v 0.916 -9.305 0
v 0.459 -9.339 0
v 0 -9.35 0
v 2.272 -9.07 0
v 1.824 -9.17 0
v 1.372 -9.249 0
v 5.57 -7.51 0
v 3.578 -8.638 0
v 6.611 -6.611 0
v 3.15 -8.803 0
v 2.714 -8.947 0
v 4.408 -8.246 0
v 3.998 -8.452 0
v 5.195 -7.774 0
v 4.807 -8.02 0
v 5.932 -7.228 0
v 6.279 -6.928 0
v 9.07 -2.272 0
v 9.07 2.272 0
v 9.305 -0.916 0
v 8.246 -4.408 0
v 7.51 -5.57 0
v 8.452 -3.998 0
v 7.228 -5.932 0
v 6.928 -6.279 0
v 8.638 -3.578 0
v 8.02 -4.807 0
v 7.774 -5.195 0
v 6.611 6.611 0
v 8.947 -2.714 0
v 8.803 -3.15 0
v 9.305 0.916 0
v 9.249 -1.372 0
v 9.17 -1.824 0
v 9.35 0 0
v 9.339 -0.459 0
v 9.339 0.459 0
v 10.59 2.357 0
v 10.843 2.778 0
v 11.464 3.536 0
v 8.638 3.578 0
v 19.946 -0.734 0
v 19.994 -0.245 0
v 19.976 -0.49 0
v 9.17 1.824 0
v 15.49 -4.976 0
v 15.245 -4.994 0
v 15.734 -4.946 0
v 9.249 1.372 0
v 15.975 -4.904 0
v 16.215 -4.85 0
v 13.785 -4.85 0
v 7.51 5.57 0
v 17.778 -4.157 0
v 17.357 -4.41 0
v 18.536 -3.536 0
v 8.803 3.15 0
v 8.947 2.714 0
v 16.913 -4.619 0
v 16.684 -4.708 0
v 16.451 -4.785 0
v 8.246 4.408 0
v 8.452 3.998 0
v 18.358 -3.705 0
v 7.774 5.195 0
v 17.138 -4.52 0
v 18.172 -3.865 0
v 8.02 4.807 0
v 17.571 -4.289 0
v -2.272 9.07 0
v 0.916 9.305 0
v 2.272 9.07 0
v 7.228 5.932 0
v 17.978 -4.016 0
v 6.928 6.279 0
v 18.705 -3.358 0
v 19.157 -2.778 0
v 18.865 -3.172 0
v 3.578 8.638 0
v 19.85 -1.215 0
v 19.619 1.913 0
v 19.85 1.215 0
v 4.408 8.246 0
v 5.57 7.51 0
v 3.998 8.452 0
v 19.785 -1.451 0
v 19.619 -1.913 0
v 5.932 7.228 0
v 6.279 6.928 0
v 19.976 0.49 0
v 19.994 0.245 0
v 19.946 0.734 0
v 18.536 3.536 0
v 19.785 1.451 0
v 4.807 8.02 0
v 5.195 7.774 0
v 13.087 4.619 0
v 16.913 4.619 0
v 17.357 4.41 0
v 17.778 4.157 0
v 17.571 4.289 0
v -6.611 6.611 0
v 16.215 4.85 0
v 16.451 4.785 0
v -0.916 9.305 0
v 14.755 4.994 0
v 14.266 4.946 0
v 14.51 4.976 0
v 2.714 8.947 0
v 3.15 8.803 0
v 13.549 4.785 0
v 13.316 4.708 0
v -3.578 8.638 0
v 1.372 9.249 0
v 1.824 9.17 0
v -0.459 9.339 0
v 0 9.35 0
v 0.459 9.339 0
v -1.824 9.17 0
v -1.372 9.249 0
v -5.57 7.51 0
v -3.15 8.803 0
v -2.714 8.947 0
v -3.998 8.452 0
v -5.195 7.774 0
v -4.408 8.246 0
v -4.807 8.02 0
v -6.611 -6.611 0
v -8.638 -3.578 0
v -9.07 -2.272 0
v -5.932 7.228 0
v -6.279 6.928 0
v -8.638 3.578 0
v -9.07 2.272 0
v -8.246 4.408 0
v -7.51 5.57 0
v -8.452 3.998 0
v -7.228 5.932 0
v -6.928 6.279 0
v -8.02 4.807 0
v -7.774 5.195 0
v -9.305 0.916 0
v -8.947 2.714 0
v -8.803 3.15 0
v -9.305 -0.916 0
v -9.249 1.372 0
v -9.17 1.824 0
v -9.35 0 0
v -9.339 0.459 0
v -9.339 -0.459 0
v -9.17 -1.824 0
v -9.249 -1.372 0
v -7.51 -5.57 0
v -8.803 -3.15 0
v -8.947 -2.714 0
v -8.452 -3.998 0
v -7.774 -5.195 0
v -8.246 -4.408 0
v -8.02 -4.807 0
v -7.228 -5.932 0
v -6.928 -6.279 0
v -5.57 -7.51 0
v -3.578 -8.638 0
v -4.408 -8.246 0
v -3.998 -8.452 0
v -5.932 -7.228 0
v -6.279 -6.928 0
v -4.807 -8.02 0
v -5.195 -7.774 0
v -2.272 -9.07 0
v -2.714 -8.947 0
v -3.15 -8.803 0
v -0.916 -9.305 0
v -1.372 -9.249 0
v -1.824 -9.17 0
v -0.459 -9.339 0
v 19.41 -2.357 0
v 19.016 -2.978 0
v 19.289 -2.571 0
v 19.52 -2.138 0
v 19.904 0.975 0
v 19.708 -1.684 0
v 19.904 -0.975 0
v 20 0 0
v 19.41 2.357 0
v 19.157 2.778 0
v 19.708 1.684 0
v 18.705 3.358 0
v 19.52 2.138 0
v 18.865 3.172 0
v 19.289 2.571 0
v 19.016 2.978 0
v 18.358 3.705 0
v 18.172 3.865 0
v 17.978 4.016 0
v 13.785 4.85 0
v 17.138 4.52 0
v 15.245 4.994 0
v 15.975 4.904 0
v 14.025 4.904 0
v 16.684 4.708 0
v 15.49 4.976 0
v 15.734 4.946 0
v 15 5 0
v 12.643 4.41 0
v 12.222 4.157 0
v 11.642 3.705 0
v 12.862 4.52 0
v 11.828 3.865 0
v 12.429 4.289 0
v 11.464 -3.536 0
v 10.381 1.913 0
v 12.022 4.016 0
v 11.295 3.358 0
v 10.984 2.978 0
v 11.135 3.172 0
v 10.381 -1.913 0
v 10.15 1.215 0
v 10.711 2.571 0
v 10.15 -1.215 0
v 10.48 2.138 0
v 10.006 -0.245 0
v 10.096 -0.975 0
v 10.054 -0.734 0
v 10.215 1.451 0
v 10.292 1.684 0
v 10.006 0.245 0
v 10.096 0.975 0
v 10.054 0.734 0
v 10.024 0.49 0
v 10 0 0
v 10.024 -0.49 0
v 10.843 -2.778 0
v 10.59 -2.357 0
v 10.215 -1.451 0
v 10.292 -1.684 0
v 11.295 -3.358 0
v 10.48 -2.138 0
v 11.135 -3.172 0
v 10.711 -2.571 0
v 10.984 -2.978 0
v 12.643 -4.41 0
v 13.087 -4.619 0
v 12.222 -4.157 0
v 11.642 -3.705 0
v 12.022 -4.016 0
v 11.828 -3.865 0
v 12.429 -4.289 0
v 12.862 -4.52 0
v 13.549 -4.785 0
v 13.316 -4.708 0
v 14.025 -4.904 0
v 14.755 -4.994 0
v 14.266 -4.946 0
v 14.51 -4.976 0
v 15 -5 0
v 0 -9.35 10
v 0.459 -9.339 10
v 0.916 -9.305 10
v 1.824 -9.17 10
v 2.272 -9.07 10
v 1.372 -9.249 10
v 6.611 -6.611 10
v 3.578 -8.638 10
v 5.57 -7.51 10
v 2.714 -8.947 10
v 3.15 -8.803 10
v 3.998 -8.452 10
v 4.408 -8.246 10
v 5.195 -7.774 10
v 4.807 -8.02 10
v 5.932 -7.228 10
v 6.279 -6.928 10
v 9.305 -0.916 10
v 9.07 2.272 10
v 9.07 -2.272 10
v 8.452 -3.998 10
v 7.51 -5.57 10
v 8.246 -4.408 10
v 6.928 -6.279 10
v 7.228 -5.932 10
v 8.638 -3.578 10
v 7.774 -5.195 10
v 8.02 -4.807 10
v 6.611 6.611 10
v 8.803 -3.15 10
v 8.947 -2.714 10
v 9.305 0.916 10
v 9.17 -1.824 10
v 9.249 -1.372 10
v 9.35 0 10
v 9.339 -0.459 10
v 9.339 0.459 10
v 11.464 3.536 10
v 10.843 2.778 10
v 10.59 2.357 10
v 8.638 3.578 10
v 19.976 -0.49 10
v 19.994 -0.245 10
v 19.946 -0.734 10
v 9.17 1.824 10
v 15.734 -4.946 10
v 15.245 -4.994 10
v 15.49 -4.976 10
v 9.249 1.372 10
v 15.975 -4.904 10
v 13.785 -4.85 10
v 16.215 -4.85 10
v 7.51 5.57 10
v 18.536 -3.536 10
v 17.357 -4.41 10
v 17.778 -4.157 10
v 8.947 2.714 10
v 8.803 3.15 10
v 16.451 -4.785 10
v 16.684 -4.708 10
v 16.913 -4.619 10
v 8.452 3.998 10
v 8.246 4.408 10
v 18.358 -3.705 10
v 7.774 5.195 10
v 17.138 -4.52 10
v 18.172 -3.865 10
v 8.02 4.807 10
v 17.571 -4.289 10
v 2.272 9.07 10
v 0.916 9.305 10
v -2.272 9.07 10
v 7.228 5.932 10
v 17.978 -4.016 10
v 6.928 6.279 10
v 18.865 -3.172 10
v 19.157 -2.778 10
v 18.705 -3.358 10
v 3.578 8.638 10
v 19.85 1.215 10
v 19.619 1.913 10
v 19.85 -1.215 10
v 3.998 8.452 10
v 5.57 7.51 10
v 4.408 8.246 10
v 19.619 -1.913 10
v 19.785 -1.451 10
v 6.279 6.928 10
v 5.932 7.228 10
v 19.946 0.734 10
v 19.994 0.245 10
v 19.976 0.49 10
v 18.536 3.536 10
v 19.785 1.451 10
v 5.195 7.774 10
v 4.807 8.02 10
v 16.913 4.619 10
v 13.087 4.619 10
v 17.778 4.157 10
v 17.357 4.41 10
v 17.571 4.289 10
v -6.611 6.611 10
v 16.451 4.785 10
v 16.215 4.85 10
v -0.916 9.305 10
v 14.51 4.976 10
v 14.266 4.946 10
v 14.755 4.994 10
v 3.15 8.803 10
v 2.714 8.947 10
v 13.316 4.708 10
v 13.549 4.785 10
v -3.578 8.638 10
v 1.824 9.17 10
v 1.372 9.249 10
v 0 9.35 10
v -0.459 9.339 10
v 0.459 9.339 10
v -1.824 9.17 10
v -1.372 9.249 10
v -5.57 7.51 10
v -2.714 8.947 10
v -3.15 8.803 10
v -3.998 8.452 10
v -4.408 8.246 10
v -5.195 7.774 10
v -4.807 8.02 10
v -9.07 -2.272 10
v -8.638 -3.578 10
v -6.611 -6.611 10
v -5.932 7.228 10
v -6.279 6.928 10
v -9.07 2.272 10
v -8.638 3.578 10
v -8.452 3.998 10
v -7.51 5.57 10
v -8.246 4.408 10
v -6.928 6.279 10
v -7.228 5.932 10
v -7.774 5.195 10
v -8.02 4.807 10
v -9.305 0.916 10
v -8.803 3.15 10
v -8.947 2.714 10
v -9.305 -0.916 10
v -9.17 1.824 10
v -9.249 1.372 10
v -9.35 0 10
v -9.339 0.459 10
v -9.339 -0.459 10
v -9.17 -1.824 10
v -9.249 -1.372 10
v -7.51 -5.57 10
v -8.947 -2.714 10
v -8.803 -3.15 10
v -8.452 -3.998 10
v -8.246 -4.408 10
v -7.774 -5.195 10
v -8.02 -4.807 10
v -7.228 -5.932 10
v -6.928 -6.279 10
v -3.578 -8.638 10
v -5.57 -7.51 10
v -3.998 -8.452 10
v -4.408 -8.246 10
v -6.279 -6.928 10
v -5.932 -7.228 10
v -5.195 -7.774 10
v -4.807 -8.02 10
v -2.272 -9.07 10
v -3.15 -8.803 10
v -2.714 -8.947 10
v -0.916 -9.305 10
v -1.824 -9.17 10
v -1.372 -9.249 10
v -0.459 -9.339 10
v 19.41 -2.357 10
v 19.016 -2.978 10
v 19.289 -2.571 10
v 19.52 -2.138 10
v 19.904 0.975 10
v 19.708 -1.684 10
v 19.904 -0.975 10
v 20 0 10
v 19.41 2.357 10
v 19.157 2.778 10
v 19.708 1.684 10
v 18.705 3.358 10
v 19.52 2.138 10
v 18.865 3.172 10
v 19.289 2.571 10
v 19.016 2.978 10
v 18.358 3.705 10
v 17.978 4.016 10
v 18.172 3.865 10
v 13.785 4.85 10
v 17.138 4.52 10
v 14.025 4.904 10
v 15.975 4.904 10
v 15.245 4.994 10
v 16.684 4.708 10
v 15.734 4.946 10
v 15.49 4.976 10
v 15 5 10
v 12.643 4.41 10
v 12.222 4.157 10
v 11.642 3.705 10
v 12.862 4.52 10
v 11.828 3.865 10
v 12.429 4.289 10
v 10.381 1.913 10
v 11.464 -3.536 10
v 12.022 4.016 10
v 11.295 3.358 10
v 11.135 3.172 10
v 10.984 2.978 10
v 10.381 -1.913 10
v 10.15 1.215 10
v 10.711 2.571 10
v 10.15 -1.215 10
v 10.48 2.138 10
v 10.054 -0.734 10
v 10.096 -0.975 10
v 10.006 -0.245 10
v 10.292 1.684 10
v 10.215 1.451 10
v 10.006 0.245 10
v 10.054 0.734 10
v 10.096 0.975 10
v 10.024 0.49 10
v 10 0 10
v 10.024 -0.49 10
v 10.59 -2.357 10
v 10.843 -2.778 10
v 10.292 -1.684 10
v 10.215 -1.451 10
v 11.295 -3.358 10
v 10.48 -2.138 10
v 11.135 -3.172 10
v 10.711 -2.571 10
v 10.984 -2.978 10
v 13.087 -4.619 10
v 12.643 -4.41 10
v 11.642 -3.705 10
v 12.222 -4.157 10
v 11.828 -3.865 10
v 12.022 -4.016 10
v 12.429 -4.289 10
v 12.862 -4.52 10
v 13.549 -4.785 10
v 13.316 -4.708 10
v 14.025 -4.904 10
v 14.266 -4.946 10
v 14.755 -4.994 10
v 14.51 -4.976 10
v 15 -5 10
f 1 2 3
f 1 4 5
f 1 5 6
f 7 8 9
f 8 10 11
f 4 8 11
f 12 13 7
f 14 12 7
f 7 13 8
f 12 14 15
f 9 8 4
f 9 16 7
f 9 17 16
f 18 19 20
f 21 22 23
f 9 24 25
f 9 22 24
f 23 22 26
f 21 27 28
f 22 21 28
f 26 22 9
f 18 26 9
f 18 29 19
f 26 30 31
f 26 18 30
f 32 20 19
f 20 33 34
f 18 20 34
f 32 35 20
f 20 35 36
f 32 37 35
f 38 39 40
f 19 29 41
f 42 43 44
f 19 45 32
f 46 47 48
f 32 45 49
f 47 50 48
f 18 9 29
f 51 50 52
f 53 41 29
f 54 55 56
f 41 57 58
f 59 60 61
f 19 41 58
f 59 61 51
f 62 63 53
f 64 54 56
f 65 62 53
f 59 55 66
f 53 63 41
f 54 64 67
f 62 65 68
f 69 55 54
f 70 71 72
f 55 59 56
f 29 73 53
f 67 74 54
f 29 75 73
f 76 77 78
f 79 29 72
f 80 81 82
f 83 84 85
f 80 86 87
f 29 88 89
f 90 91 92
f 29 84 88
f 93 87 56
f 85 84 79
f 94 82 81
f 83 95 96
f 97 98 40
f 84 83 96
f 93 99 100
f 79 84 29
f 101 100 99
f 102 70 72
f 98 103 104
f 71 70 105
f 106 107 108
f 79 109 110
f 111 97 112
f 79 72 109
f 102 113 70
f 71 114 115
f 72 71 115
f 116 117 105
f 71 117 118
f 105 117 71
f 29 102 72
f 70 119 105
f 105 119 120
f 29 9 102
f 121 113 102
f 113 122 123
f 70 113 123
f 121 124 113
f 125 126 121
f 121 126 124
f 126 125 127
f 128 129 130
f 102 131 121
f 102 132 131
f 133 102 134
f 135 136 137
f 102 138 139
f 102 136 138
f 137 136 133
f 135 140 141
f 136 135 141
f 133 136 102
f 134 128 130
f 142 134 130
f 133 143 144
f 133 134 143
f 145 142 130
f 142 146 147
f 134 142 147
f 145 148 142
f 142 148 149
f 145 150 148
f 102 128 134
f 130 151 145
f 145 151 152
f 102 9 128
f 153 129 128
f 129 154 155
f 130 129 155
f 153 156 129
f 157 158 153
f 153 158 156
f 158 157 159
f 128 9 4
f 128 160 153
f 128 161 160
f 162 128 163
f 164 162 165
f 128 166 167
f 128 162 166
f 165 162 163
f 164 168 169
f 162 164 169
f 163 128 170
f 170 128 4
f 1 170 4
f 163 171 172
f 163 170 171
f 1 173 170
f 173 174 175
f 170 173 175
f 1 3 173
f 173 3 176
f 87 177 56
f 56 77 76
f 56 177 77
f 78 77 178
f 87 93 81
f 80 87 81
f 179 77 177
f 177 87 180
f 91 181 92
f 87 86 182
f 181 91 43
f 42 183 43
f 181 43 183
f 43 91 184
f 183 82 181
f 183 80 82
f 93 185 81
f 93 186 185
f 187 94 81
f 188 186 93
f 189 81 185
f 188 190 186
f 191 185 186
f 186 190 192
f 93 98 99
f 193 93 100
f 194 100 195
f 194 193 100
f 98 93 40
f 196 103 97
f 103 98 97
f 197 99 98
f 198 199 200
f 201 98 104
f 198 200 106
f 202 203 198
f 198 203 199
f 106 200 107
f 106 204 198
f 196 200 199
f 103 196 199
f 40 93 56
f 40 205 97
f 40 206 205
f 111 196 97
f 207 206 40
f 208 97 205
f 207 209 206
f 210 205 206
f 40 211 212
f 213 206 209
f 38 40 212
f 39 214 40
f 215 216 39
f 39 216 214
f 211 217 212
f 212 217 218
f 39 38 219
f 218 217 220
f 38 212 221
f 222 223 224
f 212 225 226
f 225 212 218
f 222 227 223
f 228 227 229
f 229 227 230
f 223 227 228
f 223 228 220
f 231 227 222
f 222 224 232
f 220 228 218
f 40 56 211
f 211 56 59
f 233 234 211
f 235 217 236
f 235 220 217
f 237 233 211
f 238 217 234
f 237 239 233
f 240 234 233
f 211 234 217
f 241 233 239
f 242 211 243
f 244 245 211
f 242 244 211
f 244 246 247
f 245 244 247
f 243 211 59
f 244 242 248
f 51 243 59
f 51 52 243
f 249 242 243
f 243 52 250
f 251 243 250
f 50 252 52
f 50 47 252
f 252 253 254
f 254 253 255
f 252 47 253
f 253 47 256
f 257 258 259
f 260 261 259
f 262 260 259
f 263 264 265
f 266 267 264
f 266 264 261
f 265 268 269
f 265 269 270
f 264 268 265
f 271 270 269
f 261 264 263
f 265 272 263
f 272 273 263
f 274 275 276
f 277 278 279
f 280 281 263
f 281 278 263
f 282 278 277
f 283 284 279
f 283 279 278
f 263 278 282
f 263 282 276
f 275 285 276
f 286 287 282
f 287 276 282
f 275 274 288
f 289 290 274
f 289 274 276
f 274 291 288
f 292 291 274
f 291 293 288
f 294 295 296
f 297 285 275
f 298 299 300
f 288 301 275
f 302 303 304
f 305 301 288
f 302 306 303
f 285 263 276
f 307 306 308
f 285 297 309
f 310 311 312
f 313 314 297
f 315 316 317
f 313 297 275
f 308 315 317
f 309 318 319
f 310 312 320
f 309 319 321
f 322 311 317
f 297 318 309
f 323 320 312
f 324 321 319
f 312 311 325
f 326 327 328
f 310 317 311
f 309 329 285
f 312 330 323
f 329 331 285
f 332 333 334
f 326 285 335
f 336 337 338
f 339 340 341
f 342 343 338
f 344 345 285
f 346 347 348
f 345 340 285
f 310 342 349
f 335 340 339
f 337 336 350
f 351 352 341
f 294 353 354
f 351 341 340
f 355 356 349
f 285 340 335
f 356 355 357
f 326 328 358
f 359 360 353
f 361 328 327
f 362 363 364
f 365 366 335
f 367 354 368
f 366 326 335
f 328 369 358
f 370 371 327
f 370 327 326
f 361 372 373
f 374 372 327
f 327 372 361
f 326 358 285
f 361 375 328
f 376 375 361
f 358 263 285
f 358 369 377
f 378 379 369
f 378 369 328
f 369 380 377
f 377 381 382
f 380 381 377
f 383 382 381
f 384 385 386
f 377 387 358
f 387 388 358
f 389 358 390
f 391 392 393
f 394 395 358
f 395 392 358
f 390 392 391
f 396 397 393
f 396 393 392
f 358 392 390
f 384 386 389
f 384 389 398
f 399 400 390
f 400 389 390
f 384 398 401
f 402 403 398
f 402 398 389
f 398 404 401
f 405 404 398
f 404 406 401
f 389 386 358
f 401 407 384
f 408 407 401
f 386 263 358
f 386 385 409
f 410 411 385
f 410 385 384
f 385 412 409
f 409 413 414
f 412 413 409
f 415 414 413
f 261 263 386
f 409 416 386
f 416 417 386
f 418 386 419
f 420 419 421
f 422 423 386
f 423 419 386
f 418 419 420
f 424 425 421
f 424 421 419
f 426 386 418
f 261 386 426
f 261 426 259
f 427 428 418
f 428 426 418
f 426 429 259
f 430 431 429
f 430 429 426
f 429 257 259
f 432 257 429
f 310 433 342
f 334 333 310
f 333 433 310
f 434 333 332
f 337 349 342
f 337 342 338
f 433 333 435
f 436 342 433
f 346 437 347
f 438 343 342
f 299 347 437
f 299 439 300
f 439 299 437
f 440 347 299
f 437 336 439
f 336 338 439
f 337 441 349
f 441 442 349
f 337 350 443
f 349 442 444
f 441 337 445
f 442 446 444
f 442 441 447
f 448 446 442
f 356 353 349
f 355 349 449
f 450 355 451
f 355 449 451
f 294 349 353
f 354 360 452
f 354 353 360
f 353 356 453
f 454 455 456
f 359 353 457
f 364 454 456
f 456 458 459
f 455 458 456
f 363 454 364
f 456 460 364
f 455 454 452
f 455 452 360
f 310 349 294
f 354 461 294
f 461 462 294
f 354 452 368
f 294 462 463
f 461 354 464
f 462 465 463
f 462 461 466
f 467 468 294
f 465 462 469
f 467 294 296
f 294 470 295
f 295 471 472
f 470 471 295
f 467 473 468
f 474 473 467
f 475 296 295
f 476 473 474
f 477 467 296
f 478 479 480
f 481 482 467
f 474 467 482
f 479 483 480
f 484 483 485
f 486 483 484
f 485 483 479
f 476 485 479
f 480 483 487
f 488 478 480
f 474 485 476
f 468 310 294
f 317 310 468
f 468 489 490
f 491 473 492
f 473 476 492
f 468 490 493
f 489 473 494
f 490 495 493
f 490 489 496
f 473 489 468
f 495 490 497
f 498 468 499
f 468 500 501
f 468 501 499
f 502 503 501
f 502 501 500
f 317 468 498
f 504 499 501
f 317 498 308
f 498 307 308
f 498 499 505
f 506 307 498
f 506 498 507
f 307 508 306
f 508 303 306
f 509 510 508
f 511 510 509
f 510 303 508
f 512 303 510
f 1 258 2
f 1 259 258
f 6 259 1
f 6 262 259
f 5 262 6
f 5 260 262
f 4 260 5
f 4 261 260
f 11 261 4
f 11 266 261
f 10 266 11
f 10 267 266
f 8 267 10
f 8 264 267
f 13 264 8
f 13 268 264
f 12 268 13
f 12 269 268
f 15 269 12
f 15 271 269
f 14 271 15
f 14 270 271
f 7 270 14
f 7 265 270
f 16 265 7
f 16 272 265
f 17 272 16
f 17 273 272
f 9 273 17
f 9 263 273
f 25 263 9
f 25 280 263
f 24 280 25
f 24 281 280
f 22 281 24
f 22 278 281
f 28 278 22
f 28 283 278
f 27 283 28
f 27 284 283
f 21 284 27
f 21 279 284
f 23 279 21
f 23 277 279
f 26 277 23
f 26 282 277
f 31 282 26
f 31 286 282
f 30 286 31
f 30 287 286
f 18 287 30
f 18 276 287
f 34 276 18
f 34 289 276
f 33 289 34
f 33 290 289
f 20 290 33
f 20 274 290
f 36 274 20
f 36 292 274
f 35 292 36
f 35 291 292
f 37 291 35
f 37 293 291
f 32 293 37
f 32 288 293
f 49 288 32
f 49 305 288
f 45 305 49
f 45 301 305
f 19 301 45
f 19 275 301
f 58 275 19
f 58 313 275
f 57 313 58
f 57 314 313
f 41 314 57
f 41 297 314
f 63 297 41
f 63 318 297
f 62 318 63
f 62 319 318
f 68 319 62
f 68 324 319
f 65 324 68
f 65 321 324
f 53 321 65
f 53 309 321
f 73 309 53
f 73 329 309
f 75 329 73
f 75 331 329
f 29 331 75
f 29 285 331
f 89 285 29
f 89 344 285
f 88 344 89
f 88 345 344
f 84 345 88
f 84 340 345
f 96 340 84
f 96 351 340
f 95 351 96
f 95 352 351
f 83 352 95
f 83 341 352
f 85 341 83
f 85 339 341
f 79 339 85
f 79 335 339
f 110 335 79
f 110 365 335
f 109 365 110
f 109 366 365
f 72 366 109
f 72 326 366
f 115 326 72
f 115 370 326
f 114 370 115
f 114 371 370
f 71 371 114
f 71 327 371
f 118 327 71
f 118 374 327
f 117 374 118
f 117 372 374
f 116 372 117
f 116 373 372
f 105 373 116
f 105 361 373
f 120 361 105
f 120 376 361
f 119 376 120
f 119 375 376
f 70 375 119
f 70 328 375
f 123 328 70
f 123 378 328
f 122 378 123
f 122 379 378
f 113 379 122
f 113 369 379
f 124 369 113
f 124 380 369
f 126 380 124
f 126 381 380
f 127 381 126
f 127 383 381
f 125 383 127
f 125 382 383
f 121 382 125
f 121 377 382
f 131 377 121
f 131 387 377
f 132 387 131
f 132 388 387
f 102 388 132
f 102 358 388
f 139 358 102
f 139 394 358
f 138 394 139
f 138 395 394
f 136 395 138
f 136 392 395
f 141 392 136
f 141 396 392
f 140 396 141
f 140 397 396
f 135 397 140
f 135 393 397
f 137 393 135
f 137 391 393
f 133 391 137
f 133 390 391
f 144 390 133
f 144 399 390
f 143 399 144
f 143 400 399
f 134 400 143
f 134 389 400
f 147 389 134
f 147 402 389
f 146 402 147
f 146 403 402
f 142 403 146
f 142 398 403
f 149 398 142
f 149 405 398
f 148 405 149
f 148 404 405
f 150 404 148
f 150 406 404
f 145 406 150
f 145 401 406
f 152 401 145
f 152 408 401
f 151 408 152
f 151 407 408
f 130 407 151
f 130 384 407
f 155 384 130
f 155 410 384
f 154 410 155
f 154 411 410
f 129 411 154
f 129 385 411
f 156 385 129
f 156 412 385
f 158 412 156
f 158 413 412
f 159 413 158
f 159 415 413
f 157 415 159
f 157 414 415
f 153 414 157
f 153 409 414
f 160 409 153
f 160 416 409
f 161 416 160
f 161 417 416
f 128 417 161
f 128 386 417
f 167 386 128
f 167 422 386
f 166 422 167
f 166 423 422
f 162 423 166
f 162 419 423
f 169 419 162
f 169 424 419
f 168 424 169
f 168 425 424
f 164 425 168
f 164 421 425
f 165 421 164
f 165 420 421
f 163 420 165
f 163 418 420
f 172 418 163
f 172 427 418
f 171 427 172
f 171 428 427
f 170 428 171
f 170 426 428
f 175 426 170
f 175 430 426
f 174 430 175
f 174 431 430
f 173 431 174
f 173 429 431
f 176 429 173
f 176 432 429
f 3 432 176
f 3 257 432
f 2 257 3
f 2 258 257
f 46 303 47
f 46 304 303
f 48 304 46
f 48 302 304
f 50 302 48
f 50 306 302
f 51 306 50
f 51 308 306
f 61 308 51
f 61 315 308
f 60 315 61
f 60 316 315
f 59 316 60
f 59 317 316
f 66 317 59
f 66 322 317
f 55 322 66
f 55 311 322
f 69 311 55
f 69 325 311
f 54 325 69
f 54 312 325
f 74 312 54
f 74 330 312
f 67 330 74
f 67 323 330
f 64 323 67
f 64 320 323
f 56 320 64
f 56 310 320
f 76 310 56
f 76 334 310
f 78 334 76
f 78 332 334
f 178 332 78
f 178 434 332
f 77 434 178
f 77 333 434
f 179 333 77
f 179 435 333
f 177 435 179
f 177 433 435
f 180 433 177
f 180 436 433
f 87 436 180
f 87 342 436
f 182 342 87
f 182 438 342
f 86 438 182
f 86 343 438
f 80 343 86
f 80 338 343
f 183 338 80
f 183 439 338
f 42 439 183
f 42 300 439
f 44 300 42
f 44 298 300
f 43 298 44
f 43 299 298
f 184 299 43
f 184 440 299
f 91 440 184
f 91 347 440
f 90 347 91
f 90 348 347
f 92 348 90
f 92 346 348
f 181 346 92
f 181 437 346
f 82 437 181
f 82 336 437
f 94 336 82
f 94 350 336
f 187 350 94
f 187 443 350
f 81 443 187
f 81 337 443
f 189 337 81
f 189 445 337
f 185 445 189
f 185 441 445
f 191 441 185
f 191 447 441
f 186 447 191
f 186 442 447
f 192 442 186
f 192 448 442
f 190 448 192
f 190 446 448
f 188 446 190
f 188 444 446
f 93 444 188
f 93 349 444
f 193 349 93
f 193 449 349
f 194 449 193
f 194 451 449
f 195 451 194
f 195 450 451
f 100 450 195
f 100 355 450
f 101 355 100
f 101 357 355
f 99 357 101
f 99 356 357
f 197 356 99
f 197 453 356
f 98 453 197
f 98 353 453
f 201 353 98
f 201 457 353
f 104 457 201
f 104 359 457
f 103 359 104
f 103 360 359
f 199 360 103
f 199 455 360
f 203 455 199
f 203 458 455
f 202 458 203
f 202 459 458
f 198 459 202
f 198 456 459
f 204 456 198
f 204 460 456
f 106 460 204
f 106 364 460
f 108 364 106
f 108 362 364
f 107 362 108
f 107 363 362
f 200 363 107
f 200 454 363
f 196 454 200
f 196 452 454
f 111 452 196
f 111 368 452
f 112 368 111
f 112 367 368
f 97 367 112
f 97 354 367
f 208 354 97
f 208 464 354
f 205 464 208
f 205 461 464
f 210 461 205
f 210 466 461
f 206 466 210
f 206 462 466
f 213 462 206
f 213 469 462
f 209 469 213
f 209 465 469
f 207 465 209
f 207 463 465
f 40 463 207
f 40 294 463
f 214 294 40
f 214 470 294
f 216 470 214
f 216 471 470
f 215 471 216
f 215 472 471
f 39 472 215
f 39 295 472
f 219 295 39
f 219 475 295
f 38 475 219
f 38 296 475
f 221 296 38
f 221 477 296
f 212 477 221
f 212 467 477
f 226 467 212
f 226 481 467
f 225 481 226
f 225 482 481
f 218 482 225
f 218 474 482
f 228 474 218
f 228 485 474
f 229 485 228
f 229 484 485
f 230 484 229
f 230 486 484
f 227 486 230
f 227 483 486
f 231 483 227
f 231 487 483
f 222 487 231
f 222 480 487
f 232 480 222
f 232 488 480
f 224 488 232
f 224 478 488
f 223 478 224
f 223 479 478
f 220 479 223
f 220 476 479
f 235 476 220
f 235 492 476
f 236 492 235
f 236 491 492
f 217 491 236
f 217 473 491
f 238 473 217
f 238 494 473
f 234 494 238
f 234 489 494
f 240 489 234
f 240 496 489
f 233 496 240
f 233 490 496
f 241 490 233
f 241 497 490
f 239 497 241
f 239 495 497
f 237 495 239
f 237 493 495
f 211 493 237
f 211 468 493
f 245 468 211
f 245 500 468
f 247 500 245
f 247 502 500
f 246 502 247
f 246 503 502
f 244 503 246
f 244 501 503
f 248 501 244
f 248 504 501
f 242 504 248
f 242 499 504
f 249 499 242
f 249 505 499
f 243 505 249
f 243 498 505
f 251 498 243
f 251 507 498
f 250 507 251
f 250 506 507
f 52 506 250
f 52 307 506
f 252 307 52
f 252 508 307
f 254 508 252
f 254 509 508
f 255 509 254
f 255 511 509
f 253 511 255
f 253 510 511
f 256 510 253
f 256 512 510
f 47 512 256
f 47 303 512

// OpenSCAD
// Snap-on tubing clip for a 12.7 mm (1/2 inch) lab stand rod
// Printed flat: 2-D profile in XY, extruded 10 mm in Z

// ---------------- Parameters ----------------
rod_id      = 12.7;   // rod ring inner diameter
rod_wall    = 3;      // rod ring wall thickness
rod_od      = rod_id + 2 * rod_wall; // rod ring outer diameter (18.7)
rod_opening = 10;     // rod ring opening width (along Y)

tub_id      = 6;      // tubing ring inner diameter
tub_wall    = 2;      // tubing ring wall thickness
tub_od      = tub_id + 2 * tub_wall; // tubing ring outer diameter (10)
tub_x       = 15;     // tubing ring centre X
tub_opening = 4.5;    // tubing ring opening width (along Y)

bridge_w    = 6;      // bridge width (along Y)
bridge_x1   = 8;      // bridge start X
bridge_x2   = 12;     // bridge end X

eps         = 0.5;    // cutter overshoot past faces
$fn         = 128;    // curve resolution

// ---------------- Profile ----------------
module profile() {
    union() {
        // Rod ring with -X side opening
        difference() {
            translate([0, 0]) circle(d = rod_od);
            // cut out everything with x < 0 and -5 < y < 5
            translate([-rod_od - eps, -5])
                cube([rod_od + 2 * eps, 10, 1]);
        }

        // Tubing ring with +X side opening
        translate([tub_x, 0])
            difference() {
                circle(d = tub_od);
                // x > 15 and -2.25 < y < 2.25
                translate([tub_x - eps, -tub_opening / 2])
                    cube([tub_opening / 2 + eps, tub_opening, 1]);
            }

        // Solid bridge between the two rings
        translate([bridge_x1, -bridge_w / 2])
            cube([bridge_x2 - bridge_x1, bridge_w, 1]);
    }
}

// ---------------- Part ----------------
difference() {
    translate([0, 0, 0])
        linear_extrude(height = 10)
            profile();
    // No support removal needed: all cutters overshoot the top and bottom faces.
}
